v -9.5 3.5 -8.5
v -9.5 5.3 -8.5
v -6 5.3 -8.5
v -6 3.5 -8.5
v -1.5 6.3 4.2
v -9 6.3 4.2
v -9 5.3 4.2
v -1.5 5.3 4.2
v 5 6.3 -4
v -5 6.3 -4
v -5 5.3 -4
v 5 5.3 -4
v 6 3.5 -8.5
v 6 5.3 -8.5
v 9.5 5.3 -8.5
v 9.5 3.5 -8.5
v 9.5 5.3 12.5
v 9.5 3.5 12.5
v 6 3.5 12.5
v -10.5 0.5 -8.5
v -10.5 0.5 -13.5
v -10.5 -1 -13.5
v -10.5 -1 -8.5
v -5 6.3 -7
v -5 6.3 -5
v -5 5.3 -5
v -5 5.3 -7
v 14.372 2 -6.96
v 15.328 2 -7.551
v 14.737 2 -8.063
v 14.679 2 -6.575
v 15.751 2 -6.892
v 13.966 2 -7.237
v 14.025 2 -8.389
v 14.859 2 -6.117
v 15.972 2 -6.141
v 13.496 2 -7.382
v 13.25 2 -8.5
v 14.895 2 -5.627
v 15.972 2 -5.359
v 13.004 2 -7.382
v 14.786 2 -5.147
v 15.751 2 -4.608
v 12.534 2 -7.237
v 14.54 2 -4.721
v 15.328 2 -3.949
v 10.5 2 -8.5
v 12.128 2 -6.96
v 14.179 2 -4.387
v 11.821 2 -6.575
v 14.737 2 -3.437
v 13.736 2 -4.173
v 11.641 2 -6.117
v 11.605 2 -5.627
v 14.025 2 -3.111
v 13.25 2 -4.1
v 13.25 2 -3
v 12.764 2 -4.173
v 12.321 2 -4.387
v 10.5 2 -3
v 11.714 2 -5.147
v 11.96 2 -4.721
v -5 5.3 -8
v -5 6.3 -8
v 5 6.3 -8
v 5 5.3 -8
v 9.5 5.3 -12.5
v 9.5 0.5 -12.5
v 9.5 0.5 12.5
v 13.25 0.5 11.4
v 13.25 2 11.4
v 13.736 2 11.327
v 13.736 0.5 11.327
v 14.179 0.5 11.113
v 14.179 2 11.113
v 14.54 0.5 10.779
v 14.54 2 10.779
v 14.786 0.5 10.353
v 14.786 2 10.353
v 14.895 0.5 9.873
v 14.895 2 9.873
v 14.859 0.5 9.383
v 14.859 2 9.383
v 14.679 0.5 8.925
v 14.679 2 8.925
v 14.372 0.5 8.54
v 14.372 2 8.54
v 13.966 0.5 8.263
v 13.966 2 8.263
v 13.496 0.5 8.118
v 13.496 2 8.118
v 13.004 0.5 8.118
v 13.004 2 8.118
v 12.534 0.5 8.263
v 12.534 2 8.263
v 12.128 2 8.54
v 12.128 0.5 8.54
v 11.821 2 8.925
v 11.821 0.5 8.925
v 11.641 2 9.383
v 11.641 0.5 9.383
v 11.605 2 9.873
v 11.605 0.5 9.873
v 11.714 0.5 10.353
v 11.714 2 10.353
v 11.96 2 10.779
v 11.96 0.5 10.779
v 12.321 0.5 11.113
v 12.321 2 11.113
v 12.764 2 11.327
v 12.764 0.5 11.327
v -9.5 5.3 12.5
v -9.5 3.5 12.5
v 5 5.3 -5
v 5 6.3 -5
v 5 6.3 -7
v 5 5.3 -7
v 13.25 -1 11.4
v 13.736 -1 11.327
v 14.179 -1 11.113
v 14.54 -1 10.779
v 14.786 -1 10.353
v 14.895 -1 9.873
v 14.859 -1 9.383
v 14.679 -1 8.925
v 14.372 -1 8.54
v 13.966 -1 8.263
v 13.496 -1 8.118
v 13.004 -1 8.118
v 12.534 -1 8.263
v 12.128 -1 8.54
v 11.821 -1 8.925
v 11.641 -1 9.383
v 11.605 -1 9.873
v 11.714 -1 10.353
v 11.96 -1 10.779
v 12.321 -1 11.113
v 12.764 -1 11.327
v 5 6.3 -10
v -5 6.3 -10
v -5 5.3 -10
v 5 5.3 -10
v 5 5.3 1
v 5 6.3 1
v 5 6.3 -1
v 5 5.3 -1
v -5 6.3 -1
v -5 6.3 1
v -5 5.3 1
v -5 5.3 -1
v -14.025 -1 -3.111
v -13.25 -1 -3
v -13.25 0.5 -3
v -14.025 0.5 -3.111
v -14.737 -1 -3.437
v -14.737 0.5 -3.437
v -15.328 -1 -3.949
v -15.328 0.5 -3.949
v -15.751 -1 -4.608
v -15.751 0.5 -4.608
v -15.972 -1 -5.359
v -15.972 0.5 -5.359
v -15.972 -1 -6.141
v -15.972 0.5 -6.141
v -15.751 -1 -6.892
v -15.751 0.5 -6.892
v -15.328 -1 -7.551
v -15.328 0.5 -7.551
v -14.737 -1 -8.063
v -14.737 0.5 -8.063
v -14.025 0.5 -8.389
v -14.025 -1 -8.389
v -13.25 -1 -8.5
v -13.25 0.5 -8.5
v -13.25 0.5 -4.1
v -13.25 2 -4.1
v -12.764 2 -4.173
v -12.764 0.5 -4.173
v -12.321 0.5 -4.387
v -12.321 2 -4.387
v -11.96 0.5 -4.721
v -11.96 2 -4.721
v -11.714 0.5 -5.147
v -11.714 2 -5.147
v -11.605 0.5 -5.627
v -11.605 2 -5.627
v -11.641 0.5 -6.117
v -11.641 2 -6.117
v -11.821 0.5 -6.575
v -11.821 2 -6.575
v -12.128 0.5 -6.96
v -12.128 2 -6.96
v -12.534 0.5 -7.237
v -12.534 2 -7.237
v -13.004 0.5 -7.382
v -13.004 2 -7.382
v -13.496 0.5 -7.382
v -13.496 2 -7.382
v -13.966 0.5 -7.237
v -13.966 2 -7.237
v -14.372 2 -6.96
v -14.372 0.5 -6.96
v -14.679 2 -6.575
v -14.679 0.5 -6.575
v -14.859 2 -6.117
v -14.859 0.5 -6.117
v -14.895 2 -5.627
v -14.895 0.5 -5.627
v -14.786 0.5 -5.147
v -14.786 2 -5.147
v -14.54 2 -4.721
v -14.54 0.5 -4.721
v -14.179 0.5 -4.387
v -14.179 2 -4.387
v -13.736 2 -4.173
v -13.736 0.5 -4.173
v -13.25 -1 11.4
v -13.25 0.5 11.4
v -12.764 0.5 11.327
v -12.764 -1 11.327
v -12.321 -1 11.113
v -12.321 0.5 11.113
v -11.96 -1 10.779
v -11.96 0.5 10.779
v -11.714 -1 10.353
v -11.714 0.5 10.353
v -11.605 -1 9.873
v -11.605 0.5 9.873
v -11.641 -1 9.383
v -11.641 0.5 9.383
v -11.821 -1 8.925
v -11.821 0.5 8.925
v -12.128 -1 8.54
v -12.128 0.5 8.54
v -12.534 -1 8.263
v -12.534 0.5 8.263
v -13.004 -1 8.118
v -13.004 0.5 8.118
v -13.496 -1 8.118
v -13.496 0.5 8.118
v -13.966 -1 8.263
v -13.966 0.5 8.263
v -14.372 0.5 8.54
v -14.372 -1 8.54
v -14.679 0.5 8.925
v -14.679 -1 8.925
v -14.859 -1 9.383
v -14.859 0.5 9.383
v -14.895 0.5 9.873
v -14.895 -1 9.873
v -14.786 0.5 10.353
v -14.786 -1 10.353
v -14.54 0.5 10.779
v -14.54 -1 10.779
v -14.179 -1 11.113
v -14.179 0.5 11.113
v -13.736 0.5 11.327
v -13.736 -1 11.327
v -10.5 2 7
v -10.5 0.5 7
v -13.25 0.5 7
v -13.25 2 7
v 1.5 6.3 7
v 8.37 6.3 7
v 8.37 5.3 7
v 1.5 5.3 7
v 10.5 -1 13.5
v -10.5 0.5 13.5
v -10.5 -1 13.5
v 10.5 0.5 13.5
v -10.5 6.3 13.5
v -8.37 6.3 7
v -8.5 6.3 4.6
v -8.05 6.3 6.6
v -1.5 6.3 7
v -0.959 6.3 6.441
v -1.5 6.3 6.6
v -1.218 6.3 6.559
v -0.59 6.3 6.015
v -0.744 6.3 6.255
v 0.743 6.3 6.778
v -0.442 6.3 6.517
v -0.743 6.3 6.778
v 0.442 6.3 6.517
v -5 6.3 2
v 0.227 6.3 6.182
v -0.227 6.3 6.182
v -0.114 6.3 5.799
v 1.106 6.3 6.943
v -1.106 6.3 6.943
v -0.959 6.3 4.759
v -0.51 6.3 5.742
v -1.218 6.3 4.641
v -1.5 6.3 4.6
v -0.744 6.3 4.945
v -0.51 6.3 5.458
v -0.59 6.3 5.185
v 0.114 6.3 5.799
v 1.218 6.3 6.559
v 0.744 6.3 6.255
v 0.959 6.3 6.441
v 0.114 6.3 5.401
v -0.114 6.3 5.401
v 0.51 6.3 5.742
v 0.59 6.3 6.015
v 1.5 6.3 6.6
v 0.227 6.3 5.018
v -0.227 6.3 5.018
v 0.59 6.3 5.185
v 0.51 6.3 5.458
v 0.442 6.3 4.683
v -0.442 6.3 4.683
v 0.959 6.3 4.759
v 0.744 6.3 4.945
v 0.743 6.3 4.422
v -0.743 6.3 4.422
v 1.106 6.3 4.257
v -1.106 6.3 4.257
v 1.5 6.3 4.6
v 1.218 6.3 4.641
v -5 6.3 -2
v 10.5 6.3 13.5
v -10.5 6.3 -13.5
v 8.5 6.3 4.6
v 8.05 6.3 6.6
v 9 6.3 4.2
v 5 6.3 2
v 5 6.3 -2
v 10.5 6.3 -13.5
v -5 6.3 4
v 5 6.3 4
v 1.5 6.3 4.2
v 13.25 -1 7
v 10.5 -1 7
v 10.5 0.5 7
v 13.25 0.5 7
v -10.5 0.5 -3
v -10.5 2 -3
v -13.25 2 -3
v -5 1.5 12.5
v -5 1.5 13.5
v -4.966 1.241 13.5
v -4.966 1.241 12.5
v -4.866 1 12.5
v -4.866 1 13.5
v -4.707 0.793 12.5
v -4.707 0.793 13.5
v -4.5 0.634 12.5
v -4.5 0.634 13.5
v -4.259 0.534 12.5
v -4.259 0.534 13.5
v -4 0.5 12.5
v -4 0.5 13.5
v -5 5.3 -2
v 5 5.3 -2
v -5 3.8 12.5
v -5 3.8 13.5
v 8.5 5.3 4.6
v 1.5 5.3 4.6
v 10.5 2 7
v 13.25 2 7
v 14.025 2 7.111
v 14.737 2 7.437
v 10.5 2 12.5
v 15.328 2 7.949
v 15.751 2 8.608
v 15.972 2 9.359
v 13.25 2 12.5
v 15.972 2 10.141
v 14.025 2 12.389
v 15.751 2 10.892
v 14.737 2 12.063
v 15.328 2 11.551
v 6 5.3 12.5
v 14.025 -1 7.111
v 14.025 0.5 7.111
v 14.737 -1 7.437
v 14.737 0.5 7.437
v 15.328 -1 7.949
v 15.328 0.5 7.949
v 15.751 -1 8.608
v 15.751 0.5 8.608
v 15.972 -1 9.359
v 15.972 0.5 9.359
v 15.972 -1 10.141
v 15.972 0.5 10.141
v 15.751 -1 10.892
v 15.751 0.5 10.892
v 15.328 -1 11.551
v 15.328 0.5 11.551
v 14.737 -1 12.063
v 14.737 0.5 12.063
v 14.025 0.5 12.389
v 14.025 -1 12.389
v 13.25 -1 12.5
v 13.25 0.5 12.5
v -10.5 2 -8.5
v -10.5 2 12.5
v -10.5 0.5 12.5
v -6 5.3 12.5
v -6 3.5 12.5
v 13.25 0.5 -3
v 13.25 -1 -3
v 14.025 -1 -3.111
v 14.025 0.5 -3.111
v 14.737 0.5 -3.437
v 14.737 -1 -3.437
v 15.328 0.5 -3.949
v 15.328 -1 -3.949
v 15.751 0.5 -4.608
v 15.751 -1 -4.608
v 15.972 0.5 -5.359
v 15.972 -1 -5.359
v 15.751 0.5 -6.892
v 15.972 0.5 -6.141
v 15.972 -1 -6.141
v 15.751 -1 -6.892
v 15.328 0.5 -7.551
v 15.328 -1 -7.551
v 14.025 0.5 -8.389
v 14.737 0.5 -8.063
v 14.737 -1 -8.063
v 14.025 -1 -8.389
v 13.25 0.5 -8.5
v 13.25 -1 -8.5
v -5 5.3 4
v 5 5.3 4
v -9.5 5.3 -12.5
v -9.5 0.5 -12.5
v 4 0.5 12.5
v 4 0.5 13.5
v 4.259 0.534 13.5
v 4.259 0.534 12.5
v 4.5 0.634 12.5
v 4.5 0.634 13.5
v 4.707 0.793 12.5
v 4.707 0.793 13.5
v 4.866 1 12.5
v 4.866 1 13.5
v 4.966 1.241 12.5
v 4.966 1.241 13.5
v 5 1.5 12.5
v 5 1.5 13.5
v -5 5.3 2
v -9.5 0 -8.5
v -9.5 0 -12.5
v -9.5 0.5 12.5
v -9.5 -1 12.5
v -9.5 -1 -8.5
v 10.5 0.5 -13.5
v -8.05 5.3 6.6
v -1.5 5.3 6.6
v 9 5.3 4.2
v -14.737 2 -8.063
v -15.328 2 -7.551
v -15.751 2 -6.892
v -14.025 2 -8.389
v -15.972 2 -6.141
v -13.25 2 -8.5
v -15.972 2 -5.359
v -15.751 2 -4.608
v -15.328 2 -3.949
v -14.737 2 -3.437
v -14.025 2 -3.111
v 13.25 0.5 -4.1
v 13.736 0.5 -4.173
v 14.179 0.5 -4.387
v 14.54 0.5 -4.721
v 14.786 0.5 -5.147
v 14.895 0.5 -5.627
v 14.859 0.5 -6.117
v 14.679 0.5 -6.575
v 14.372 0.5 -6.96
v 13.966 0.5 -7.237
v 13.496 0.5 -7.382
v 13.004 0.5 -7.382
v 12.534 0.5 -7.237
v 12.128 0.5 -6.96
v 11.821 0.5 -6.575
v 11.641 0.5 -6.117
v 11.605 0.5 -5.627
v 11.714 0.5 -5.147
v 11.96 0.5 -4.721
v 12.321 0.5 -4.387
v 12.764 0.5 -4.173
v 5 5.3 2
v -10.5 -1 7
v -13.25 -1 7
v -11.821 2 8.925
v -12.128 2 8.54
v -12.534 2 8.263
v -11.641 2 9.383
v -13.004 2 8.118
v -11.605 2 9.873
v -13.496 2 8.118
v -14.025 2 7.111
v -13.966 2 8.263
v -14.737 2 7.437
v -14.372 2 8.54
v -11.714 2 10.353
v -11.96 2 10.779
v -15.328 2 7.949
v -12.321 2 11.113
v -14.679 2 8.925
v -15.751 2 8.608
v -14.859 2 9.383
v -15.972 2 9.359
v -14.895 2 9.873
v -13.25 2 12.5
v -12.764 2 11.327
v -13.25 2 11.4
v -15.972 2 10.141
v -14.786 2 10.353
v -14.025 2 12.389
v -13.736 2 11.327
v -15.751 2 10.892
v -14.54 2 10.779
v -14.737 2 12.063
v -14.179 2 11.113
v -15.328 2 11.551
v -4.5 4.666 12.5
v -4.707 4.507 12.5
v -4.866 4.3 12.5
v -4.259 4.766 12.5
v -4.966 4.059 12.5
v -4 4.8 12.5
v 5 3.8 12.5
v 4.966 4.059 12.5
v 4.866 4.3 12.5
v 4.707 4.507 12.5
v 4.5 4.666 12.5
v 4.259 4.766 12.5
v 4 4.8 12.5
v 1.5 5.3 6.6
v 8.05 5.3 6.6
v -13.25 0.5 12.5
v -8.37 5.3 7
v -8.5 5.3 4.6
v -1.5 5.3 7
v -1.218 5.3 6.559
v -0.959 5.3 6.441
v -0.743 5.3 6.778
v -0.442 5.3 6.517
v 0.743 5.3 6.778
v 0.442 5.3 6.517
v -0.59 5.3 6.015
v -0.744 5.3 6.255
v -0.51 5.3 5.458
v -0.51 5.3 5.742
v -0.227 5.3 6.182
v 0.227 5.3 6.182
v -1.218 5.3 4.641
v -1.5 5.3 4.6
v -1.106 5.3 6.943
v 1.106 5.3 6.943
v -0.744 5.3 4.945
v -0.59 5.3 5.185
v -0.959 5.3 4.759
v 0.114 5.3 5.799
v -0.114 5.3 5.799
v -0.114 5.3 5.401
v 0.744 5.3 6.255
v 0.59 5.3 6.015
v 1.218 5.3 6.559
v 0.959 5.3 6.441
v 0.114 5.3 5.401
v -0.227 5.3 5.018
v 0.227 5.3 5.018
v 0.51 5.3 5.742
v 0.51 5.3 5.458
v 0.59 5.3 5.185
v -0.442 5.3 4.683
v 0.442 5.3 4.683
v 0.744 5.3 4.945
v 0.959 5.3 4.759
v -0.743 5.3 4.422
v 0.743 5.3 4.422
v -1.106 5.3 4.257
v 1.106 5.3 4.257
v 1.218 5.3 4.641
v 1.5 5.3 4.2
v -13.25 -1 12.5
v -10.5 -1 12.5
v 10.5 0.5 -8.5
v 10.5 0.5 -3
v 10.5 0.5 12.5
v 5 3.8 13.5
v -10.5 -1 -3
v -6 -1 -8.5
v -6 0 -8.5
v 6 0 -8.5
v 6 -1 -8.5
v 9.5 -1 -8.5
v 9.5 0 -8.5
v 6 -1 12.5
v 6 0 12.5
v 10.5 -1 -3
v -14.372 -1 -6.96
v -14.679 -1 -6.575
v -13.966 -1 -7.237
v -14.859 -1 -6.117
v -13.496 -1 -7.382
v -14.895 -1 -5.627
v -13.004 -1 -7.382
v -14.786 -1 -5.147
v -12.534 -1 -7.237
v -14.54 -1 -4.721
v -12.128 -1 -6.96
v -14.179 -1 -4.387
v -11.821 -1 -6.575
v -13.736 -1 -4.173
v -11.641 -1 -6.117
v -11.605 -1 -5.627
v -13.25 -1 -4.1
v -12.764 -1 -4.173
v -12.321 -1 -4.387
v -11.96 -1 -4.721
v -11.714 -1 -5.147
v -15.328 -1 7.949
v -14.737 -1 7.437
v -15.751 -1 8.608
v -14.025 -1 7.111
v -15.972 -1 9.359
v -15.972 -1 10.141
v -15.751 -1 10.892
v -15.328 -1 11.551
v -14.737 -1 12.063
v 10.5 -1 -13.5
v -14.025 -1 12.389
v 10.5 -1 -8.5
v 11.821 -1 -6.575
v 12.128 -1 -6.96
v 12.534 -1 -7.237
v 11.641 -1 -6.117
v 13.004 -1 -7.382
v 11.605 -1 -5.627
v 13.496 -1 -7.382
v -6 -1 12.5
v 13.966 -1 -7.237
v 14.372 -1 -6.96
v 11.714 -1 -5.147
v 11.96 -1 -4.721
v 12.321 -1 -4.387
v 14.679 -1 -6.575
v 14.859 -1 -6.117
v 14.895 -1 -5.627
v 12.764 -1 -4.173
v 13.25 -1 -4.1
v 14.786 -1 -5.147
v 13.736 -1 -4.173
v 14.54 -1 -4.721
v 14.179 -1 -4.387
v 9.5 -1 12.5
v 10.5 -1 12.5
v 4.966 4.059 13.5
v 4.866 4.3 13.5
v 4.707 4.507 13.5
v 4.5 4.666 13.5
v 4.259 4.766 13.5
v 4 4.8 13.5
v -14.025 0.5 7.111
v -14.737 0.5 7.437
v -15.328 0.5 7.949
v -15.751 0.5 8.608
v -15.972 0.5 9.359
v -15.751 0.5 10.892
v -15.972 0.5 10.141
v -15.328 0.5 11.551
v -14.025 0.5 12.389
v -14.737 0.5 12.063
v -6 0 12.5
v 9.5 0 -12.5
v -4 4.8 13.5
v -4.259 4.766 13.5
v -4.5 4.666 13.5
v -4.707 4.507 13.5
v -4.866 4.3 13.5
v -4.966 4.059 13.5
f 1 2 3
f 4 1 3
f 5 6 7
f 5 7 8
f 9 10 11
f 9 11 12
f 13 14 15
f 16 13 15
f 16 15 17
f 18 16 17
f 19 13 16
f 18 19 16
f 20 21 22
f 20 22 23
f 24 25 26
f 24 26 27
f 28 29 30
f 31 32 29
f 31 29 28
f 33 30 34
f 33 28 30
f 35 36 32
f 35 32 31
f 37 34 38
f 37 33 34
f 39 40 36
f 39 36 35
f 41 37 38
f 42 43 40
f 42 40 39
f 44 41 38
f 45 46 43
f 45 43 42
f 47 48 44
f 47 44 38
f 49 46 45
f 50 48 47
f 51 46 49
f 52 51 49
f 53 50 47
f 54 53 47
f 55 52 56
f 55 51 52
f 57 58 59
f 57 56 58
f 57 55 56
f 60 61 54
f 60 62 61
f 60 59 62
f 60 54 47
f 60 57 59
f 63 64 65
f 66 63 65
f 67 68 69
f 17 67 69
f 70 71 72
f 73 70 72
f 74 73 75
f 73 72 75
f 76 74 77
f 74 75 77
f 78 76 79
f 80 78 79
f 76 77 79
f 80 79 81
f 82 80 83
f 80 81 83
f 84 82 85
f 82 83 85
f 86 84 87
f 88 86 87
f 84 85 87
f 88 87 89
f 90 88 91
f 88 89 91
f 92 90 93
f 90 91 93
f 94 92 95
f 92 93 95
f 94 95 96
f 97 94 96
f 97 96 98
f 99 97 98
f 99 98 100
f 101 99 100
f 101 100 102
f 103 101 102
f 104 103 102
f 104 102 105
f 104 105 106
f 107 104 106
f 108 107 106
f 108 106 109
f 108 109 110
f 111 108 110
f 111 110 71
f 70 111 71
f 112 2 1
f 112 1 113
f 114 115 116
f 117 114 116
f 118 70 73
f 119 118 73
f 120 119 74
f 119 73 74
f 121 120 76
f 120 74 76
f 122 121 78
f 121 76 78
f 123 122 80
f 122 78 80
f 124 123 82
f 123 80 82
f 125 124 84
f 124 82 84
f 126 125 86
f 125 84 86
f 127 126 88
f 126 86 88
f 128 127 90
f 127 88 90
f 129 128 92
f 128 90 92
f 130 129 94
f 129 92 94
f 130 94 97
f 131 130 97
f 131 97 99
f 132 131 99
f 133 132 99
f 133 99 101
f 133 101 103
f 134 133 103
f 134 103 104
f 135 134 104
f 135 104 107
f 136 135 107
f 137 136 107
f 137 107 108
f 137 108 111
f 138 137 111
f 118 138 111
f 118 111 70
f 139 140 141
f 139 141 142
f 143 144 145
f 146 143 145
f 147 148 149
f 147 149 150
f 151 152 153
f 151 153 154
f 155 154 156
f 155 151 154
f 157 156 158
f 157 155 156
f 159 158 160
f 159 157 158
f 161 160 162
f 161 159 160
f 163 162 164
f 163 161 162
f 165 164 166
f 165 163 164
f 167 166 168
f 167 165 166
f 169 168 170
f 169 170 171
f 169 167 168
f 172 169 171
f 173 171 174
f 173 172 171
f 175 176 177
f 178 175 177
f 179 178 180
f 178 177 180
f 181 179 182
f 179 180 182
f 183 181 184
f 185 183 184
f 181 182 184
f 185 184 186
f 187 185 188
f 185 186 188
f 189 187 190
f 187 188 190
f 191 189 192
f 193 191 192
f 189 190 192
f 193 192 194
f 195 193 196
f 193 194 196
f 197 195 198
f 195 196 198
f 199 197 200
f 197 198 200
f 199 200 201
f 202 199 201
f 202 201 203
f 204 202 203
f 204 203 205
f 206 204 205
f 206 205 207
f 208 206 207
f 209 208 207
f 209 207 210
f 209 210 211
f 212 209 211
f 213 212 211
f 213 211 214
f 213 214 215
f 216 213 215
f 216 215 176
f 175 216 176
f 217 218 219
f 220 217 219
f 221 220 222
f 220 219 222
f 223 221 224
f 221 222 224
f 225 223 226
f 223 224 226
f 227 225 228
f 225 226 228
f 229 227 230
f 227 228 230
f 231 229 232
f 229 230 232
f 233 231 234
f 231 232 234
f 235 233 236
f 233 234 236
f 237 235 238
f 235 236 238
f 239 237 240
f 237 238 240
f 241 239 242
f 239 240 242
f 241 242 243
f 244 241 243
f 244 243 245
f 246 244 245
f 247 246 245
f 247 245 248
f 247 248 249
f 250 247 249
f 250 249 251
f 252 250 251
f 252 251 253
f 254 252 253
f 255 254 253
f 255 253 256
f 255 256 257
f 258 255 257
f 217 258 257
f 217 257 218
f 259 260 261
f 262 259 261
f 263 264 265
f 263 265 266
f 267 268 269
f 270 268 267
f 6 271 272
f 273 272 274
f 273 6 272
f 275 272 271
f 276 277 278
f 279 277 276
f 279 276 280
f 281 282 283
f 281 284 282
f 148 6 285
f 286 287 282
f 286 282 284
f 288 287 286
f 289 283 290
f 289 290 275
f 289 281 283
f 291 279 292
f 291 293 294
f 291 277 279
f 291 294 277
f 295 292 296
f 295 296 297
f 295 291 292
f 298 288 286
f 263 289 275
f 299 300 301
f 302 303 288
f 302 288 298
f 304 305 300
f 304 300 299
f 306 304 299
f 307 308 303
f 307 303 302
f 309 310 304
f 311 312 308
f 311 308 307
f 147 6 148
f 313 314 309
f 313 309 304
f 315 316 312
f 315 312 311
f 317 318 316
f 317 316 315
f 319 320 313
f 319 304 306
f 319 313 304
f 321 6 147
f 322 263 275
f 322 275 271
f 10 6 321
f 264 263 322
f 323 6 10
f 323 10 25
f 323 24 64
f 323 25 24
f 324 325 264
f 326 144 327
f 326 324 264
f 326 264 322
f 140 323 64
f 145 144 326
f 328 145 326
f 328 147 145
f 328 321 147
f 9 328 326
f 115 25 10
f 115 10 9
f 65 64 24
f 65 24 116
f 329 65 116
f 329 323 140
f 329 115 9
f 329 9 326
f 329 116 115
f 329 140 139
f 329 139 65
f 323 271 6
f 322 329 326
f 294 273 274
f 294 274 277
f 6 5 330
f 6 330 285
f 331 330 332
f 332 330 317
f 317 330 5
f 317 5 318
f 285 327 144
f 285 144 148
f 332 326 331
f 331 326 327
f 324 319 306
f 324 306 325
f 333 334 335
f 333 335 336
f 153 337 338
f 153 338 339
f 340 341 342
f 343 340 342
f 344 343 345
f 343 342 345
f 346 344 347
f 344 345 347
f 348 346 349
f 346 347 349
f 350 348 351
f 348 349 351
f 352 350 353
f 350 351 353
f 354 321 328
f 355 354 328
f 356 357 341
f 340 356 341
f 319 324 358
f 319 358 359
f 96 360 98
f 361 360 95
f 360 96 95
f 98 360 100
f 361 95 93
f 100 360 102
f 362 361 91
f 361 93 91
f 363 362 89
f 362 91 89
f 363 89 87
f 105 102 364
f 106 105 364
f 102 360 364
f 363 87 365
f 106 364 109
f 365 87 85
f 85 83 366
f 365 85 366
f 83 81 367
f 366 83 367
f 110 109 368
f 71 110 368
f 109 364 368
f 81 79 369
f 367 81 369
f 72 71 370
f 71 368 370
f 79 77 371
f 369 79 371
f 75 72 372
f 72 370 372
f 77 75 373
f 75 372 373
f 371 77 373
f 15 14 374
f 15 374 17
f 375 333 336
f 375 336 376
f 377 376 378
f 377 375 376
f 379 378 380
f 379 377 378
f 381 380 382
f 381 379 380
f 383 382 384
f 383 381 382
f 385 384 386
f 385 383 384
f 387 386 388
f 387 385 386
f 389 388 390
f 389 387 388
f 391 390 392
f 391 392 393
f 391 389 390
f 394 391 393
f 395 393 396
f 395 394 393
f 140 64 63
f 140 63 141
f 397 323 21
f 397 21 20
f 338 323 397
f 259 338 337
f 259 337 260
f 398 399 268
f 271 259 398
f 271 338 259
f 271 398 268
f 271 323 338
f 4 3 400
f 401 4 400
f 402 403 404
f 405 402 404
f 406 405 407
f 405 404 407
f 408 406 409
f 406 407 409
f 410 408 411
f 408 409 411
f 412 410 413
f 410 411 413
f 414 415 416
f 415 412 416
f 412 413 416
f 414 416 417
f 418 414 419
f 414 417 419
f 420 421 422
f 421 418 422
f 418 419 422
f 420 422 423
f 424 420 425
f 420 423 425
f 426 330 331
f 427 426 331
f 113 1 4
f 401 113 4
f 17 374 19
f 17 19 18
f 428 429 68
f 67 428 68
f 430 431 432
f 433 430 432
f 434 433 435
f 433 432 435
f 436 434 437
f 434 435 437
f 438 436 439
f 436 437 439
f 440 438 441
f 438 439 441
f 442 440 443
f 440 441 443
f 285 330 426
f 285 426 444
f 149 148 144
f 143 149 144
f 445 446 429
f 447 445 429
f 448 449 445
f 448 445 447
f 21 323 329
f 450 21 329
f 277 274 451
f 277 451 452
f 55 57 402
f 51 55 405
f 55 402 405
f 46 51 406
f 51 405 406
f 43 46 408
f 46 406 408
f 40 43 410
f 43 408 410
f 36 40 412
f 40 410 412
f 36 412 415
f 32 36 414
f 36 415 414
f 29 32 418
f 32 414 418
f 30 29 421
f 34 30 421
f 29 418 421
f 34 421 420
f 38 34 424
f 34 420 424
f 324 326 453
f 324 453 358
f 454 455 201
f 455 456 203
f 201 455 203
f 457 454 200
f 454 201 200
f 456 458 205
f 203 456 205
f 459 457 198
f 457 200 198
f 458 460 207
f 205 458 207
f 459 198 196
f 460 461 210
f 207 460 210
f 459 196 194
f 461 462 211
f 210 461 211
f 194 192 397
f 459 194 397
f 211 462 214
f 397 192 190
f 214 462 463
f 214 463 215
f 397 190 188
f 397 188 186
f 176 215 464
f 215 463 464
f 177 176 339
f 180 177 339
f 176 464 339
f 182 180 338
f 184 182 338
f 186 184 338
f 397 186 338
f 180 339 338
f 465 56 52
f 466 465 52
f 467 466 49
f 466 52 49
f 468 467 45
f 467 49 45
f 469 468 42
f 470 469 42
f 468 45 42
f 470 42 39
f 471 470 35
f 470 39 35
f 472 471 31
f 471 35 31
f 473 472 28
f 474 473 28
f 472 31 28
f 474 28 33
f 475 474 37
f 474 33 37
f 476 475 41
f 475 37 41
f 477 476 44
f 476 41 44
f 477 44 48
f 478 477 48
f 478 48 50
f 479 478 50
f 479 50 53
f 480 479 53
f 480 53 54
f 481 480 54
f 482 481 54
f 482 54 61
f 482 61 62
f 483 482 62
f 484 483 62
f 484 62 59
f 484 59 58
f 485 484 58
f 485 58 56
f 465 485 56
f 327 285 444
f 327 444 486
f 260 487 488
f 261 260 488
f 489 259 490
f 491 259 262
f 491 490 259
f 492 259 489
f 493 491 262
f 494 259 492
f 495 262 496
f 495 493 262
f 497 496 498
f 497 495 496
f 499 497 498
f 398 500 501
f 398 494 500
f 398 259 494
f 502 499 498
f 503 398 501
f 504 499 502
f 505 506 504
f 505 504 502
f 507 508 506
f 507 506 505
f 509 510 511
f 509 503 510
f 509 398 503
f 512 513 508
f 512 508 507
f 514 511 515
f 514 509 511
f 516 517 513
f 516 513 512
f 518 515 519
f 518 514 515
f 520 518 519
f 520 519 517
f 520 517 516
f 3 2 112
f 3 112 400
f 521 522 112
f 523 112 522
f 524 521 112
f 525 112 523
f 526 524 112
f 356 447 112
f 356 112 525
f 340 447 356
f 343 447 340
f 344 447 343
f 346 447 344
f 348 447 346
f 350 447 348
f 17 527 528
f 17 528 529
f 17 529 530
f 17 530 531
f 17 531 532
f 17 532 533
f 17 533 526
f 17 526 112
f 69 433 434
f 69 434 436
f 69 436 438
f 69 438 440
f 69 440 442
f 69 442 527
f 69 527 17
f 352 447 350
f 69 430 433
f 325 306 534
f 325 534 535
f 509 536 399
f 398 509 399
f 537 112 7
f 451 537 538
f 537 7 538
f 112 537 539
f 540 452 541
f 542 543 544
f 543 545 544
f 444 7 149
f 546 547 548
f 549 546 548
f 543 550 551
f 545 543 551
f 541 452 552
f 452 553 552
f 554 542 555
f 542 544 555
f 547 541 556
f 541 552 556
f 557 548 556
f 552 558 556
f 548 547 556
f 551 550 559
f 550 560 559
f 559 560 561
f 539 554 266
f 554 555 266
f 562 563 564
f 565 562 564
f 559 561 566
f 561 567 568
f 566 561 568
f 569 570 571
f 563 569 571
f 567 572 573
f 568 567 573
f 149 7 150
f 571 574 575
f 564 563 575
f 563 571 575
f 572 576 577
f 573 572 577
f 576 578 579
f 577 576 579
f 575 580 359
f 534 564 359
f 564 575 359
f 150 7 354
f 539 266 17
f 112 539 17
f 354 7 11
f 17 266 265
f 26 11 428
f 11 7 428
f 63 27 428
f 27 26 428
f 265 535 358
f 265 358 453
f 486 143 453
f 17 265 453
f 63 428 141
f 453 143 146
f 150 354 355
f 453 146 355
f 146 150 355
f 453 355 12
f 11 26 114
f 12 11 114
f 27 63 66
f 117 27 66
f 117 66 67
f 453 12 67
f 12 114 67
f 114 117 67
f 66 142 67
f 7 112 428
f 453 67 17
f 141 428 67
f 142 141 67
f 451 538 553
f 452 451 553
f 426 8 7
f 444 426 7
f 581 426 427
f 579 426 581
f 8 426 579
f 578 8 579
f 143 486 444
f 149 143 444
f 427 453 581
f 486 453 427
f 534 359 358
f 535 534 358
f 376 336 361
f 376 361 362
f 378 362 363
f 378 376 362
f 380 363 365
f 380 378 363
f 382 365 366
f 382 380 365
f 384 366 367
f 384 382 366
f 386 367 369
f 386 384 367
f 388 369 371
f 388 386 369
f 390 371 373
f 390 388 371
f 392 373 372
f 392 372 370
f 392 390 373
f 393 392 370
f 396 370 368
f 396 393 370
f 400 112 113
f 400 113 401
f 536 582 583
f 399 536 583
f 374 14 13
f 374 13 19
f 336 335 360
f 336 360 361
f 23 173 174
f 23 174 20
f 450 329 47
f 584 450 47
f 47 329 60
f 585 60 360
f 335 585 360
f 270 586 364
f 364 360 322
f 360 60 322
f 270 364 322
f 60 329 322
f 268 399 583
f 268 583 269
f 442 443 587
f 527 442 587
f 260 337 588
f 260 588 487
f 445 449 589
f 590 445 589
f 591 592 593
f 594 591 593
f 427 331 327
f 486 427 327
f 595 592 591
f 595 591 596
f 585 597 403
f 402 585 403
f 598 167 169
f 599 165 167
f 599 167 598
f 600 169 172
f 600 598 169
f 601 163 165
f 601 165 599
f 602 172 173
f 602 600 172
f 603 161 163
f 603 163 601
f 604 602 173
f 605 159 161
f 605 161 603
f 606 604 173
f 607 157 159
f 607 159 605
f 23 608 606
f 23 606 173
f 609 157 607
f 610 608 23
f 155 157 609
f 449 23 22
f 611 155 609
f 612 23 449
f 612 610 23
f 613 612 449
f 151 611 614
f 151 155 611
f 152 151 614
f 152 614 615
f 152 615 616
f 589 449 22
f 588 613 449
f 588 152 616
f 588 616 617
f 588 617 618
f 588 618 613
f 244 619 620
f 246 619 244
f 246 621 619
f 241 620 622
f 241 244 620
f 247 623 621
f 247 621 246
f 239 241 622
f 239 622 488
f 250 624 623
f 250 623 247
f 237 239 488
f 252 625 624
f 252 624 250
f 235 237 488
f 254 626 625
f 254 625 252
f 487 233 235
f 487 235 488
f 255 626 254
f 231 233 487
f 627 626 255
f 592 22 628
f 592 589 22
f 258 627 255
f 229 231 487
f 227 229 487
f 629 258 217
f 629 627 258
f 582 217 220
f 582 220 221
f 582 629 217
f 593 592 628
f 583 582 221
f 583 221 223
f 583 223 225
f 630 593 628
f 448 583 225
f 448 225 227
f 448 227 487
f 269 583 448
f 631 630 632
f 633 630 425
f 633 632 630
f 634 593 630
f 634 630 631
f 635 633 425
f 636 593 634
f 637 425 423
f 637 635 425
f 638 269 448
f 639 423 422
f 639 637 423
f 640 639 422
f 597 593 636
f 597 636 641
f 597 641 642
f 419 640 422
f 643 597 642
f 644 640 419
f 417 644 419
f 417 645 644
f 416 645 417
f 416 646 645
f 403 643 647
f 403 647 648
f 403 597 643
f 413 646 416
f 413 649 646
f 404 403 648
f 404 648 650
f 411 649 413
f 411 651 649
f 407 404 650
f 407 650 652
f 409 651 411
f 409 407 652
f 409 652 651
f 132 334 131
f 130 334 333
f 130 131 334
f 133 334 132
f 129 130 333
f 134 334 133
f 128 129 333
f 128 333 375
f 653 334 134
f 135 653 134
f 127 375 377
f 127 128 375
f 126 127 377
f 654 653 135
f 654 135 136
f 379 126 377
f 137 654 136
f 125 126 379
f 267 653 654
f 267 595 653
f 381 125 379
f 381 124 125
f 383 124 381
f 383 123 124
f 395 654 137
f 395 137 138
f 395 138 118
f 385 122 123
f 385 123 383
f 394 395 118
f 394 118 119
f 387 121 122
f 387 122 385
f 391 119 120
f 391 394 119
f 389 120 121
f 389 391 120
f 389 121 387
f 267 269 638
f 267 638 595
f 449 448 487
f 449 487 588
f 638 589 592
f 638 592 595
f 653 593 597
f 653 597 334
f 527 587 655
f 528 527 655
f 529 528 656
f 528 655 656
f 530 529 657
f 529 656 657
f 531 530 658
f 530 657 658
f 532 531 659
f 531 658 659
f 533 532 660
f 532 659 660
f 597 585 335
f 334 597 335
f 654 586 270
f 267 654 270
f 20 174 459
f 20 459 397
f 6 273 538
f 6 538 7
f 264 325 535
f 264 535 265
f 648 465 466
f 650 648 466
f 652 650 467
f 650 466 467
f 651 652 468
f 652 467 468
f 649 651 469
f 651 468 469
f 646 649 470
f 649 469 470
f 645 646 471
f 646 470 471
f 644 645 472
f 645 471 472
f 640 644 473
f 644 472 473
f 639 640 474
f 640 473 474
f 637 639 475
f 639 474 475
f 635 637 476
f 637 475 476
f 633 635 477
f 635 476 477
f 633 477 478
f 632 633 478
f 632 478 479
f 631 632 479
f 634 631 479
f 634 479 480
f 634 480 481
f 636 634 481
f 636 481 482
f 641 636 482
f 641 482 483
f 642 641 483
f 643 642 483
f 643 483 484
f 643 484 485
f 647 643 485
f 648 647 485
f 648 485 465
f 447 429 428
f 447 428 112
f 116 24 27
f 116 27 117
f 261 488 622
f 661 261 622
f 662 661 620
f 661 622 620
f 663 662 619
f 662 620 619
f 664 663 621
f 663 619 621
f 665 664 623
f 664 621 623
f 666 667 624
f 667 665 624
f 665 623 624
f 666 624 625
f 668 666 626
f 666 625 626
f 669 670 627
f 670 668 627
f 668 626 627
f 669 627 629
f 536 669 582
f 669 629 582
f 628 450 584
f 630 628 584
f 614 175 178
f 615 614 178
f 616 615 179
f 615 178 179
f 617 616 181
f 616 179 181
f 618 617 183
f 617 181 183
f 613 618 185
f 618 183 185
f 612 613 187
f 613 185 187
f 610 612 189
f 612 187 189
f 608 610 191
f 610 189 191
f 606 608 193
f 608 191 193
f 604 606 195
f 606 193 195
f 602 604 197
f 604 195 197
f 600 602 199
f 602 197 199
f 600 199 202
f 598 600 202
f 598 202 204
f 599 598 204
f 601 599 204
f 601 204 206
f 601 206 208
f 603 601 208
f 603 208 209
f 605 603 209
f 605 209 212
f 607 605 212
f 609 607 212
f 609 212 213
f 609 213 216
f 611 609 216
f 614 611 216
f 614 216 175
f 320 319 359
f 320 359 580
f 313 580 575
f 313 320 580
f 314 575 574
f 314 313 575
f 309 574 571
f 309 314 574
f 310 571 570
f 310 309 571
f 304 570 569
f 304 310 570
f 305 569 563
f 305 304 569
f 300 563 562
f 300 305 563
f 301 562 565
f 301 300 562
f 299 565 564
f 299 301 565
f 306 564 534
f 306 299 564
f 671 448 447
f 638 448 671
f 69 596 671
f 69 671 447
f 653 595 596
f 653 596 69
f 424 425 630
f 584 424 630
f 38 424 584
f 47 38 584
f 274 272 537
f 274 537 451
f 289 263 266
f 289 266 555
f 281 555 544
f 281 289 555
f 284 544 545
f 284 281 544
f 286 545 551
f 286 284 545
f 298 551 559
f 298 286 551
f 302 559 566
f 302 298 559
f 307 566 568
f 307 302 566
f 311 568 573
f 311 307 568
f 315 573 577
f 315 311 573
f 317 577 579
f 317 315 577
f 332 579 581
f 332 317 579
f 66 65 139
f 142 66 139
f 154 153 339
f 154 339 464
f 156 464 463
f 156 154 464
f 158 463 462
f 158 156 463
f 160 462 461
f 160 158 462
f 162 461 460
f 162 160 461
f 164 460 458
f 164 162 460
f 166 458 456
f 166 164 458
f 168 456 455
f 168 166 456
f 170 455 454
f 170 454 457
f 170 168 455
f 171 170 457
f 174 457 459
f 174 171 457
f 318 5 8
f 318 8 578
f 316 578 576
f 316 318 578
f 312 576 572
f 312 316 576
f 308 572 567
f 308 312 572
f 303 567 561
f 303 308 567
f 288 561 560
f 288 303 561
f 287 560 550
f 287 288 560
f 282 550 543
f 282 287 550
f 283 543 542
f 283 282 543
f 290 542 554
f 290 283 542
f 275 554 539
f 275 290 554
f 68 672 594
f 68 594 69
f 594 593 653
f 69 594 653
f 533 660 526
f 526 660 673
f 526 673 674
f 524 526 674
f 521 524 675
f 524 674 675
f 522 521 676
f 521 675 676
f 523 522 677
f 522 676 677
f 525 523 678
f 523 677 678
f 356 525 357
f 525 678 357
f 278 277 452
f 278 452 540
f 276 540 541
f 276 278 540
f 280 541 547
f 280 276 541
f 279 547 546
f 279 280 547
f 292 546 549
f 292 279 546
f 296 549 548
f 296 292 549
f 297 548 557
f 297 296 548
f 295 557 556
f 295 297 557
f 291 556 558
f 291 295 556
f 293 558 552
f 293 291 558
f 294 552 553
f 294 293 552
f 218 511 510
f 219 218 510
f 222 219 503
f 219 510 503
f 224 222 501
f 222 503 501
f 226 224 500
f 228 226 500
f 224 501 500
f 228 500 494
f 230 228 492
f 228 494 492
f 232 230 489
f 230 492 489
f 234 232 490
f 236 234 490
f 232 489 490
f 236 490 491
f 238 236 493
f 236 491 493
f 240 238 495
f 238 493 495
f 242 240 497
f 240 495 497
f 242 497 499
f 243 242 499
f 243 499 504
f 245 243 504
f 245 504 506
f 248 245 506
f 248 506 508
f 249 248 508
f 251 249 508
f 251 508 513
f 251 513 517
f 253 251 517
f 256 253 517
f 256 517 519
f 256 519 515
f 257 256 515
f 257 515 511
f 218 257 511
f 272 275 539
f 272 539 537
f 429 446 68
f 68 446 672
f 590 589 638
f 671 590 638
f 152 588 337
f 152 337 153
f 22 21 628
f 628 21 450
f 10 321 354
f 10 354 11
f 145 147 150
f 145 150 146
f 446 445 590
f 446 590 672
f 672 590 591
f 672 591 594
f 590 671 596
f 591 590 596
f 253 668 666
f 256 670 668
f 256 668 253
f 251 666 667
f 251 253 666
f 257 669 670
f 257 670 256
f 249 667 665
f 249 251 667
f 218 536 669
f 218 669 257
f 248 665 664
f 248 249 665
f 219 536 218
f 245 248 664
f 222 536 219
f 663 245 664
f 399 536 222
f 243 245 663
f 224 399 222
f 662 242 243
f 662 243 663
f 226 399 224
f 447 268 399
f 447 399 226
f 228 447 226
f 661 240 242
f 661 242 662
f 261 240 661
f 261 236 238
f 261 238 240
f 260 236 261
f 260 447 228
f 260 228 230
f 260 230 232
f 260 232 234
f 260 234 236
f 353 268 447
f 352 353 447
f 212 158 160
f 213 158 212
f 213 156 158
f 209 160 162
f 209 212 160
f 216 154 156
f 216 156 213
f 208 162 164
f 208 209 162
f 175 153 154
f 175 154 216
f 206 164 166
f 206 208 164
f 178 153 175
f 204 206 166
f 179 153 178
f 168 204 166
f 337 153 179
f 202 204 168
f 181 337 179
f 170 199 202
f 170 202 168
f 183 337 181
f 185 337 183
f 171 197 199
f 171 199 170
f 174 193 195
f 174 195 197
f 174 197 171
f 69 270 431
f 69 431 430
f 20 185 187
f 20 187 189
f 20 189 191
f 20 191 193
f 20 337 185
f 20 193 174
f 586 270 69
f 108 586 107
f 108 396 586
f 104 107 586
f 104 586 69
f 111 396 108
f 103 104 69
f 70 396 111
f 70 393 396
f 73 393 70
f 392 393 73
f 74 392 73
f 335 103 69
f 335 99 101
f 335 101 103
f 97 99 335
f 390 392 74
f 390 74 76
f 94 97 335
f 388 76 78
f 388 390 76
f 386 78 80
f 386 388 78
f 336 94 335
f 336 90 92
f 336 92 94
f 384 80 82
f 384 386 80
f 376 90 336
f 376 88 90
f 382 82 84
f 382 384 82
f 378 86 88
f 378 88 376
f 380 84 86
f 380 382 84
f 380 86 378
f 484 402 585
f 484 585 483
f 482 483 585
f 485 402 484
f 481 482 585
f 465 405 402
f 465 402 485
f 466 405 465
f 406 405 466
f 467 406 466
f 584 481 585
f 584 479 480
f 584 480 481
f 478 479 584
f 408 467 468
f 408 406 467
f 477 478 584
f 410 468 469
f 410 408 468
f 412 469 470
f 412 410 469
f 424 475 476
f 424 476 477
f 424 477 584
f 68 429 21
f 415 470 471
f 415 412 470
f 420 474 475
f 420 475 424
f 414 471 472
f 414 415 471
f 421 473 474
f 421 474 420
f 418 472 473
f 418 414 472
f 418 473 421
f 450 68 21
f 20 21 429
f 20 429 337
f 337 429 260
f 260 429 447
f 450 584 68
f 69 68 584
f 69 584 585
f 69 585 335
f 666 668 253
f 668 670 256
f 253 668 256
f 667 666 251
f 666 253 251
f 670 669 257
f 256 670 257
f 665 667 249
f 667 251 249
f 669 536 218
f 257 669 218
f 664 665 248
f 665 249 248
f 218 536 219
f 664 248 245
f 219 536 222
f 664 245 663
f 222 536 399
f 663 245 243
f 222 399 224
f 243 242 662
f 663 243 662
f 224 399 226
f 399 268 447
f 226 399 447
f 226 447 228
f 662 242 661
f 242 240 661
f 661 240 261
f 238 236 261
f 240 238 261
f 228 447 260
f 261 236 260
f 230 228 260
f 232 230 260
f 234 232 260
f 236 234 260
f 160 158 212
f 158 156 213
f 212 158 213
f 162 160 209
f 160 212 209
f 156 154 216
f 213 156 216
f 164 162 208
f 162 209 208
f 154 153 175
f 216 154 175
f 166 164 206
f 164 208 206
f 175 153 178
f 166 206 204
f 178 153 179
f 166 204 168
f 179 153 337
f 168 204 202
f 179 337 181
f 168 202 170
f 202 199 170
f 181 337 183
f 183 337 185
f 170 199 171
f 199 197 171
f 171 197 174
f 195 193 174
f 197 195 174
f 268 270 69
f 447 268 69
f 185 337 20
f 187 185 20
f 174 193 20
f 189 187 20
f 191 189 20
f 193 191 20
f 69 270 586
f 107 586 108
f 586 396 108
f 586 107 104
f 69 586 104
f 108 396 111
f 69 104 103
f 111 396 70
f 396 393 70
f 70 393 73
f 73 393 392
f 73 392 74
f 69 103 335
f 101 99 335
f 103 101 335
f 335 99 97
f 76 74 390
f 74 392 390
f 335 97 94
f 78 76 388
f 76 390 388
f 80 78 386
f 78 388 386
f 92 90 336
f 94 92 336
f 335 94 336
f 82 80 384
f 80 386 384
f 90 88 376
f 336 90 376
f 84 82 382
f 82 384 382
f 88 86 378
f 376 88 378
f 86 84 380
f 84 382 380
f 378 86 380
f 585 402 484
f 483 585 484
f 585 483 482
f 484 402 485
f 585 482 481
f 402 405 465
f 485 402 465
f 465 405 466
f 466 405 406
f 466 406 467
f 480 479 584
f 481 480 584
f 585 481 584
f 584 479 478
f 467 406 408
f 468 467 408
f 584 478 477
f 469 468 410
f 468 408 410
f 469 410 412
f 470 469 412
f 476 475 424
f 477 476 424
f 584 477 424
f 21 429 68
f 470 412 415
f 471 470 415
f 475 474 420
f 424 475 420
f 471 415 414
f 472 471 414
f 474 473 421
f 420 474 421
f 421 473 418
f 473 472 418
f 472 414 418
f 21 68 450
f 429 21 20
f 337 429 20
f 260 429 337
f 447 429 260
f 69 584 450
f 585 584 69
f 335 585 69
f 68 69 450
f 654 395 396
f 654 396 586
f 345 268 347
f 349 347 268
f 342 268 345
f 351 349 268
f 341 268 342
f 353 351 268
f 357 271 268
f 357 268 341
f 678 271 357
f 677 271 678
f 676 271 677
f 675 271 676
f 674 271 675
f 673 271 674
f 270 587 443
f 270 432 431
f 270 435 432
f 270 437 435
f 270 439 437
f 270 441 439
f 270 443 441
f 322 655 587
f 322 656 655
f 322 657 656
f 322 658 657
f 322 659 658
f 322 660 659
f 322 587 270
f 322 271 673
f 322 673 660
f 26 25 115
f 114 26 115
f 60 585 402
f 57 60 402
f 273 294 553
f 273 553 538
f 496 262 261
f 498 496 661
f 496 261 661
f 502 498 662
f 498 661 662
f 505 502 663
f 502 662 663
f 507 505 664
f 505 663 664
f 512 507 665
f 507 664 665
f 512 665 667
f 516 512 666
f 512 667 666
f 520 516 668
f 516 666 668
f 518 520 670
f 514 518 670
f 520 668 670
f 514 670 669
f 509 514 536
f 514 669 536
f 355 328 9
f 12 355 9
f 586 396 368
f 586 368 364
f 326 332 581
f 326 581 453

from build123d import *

# Parameters (mm, degrees)
SKETCH_1_W          = 21
SKETCH_1_H          = 27
SKETCH_1_W_2        = 19
SKETCH_1_H_2        = 25
EXTRUDE_1_DEPTH     = 6.3
CUT_EXTRUDE_1_REACH = 31.647
SKETCH_3_W          = 21
SKETCH_3_H          = 27
EXTRUDE_1_2_DEPTH   = 1
CUT_EXTRUDE_2_REACH = 20.595
SKETCH_4_W          = 3.5
SKETCH_4_H          = 21
EXTRUDE_2_DEPTH     = 3
CUT_EXTRUDE_3_REACH = 23.371
SKETCH_6_R          = 1.65
SKETCH_7_W          = 19
SKETCH_7_H          = 25
EXTRUDE_3_DEPTH     = 1
SKETCH_8_W          = 3.5
SKETCH_8_H          = 21
EXTRUDE_4_DEPTH     = 1.8
EXTRUDE_4_2_DEPTH   = 1.8
SKETCH_9_W          = 10
SKETCH_9_H          = 2
CUT_EXTRUDE_6_DEPTH = 1
CUT_EXTRUDE_7_DEPTH = 1


with BuildPart() as part:
    # 草图1 → Extrude 1 (new body)
    with BuildSketch(Plane.XZ):
        Rectangle(SKETCH_1_W, SKETCH_1_H)
        Rectangle(SKETCH_1_W_2, SKETCH_1_H_2, mode=Mode.SUBTRACT)
    extrude(amount=-EXTRUDE_1_DEPTH)

    # 草图2 → 切除-拉伸1 (cut, up to next)
    with BuildSketch(Plane.XY.offset(13.5), mode=Mode.PRIVATE) as cut_extrude_1_sk1:
        with BuildLine():
            Line((-4, 0.5), (4, 0.5))
            ThreePointArc((4, 0.5), (4.707106781, 0.792893219), (5, 1.5))
            Line((5, 1.5), (5, 3.8))
            ThreePointArc((5, 3.8), (4.707106781, 4.507106781), (4, 4.8))
            Line((4, 4.8), (-4, 4.8))
            ThreePointArc((-4, 4.8), (-4.707106781, 4.507106781), (-5, 3.8))
            Line((-5, 3.8), (-5, 1.5))
            ThreePointArc((-5, 1.5), (-4.707106781, 0.792893219), (-4, 0.5))
        make_face()
    cut_extrude_1_tool1 = extrude(cut_extrude_1_sk1.sketch, amount=-CUT_EXTRUDE_1_REACH, mode=Mode.PRIVATE) & part.part
    add(cut_extrude_1_tool1.solids().sort_by_distance((0, 2.65, 13.5))[0], mode=Mode.SUBTRACT)

    # 草图3 → Extrude 1 2 (add)
    with BuildSketch(Plane.XZ):
        Rectangle(SKETCH_3_W, SKETCH_3_H)
    extrude(amount=EXTRUDE_1_2_DEPTH)

    # 草图4 → 切除-拉伸2 (cut, up to next)
    with BuildSketch(Plane.XZ.offset(1), mode=Mode.PRIVATE) as cut_extrude_2_sk1:
        with Locations((-7.75, 2)):
            Rectangle(SKETCH_4_W, SKETCH_4_H)
    cut_extrude_2_tool1 = extrude(cut_extrude_2_sk1.sketch, amount=-CUT_EXTRUDE_2_REACH, mode=Mode.PRIVATE) & part.part
    # 草图4 → 切除-拉伸2 (cut, up to next)
    with BuildSketch(Plane.XZ.offset(1), mode=Mode.PRIVATE) as cut_extrude_2_sk2:
        with Locations((7.75, 2)):
            Rectangle(SKETCH_4_W, SKETCH_4_H)
    cut_extrude_2_tool2 = extrude(cut_extrude_2_sk2.sketch, amount=-CUT_EXTRUDE_2_REACH, mode=Mode.PRIVATE) & part.part
    add(cut_extrude_2_tool1.solids().sort_by_distance((-7.75, -1, 2))[0], mode=Mode.SUBTRACT)
    add(cut_extrude_2_tool2.solids().sort_by_distance((7.75, -1, 2))[0], mode=Mode.SUBTRACT)

    # 草图5 → 凸台-拉伸2 (add)
    with BuildSketch(Plane.XZ.offset(1)):
        with BuildLine():
            Line((-13.25, 12.5), (-10.5, 12.5))
            Line((-10.5, 12.5), (-10.5, 7))
            Line((-10.5, 7), (-13.25, 7))
            ThreePointArc((-13.25, 7), (-16, 9.75), (-13.25, 12.5))
        make_face()
        with BuildLine():
            Line((-10.5, -8.5), (-10.5, -3))
            Line((-10.5, -3), (-13.25, -3))
            ThreePointArc((-13.25, -3), (-16, -5.75), (-13.25, -8.5))
            Line((-13.25, -8.5), (-10.5, -8.5))
        make_face()
        with BuildLine():
            Line((13.25, -8.5), (10.5, -8.5))
            Line((10.5, -8.5), (10.5, -3))
            Line((10.5, -3), (13.25, -3))
            ThreePointArc((13.25, -3), (16, -5.75), (13.25, -8.5))
        make_face()
        with BuildLine():
            Line((10.5, 12.5), (10.5, 7))
            Line((10.5, 7), (13.25, 7))
            ThreePointArc((13.25, 7), (16, 9.75), (13.25, 12.5))
            Line((13.25, 12.5), (10.5, 12.5))
        make_face()
    extrude(amount=-EXTRUDE_2_DEPTH)

    # 草图6 → 切除-拉伸3 (cut, up to next)
    with BuildSketch(Plane(origin=(0, 2, 0), x_dir=(1, 0, 0), z_dir=(0, 1, 0)), mode=Mode.PRIVATE) as cut_extrude_3_sk1:
        with Locations(Location((-13.25, 5.75, 0), (0, 0, 270))):
            Circle(SKETCH_6_R)
    cut_extrude_3_tool1 = extrude(cut_extrude_3_sk1.sketch, amount=-CUT_EXTRUDE_3_REACH, mode=Mode.PRIVATE) & part.part
    # 草图6 → 切除-拉伸3 (cut, up to next)
    with BuildSketch(Plane(origin=(0, 2, 0), x_dir=(1, 0, 0), z_dir=(0, 1, 0)), mode=Mode.PRIVATE) as cut_extrude_3_sk2:
        with Locations(Location((-13.25, -9.75, 0), (0, 0, 270))):
            Circle(SKETCH_6_R)
    cut_extrude_3_tool2 = extrude(cut_extrude_3_sk2.sketch, amount=-CUT_EXTRUDE_3_REACH, mode=Mode.PRIVATE) & part.part
    # 草图6 → 切除-拉伸3 (cut, up to next)
    with BuildSketch(Plane(origin=(0, 2, 0), x_dir=(1, 0, 0), z_dir=(0, 1, 0)), mode=Mode.PRIVATE) as cut_extrude_3_sk3:
        with Locations(Location((13.25, -9.75, 0), (0, 0, 270))):
            Circle(SKETCH_6_R)
    cut_extrude_3_tool3 = extrude(cut_extrude_3_sk3.sketch, amount=-CUT_EXTRUDE_3_REACH, mode=Mode.PRIVATE) & part.part
    # 草图6 → 切除-拉伸3 (cut, up to next)
    with BuildSketch(Plane(origin=(0, 2, 0), x_dir=(1, 0, 0), z_dir=(0, 1, 0)), mode=Mode.PRIVATE) as cut_extrude_3_sk4:
        with Locations(Location((13.25, 5.75, 0), (0, 0, 270))):
            Circle(SKETCH_6_R)
    cut_extrude_3_tool4 = extrude(cut_extrude_3_sk4.sketch, amount=-CUT_EXTRUDE_3_REACH, mode=Mode.PRIVATE) & part.part
    add(cut_extrude_3_tool1.solids().sort_by_distance((-13.25, 2, -5.75))[0], mode=Mode.SUBTRACT)
    add(cut_extrude_3_tool2.solids().sort_by_distance((-13.25, 2, 9.75))[0], mode=Mode.SUBTRACT)
    add(cut_extrude_3_tool3.solids().sort_by_distance((13.25, 2, 9.75))[0], mode=Mode.SUBTRACT)
    add(cut_extrude_3_tool4.solids().sort_by_distance((13.25, 2, -5.75))[0], mode=Mode.SUBTRACT)

    # 草图7 → 凸台-拉伸3 (add)
    with BuildSketch(Plane(origin=(0, 6.3, 0), x_dir=(1, 0, 0), z_dir=(0, 1, 0))):
        Rectangle(SKETCH_7_W, SKETCH_7_H)
    extrude(amount=-EXTRUDE_3_DEPTH)

    # 草图9 → 切除-拉伸6 (cut)
    with BuildSketch(Plane(origin=(0, 6.3, 0), x_dir=(1, 0, 0), z_dir=(0, 1, 0))):
        with Locations((0, 9)):
            Rectangle(SKETCH_9_W, SKETCH_9_H)
        with Locations((0, 6)):
            Rectangle(SKETCH_9_W, SKETCH_9_H)
        with Locations((0, 3)):
            Rectangle(SKETCH_9_W, SKETCH_9_H)
        Rectangle(SKETCH_9_W, SKETCH_9_H)
        with Locations((0, -3)):
            Rectangle(SKETCH_9_W, SKETCH_9_H)
    extrude(amount=-CUT_EXTRUDE_6_DEPTH, mode=Mode.SUBTRACT)

    # 草图10 → 切除-拉伸7 (cut)
    with BuildSketch(Plane(origin=(0, 6.3, 0), x_dir=(1, 0, 0), z_dir=(0, 1, 0))):
        with BuildLine():
            Line((-1.5, -4.6), (-8.5, -4.6))
            Line((-8.5, -4.6), (-9, -4.2))
            Line((-9, -4.2), (-1.5, -4.2))
            ThreePointArc((-1.5, -4.2), (-0.1, -5.6), (-1.5, -7))
            Line((-1.5, -7), (-8.37, -7))
            Line((-8.37, -7), (-8.05, -6.6))
            Line((-8.05, -6.6), (-1.5, -6.6))
            ThreePointArc((-1.5, -6.6), (-0.5, -5.6), (-1.5, -4.6))
        make_face()
        with BuildLine():
            Line((8.05, -6.6), (8.37, -7))
            Line((8.37, -7), (1.5, -7))
            ThreePointArc((1.5, -7), (0.1, -5.6), (1.5, -4.2))
            Line((1.5, -4.2), (9, -4.2))
            Line((9, -4.2), (8.5, -4.6))
            Line((8.5, -4.6), (1.5, -4.6))
            ThreePointArc((1.5, -4.6), (0.5, -5.6), (1.5, -6.6))
            Line((1.5, -6.6), (8.05, -6.6))
        make_face()
    extrude(amount=-CUT_EXTRUDE_7_DEPTH, mode=Mode.SUBTRACT)


with BuildPart() as body_2:
    # 草图8 → 凸台-拉伸4 (new body)
    with BuildSketch(Plane.XZ.offset(-5.3)):
        with Locations((-7.75, 2)):
            Rectangle(SKETCH_8_W, SKETCH_8_H)
    extrude(amount=EXTRUDE_4_DEPTH)


with BuildPart() as body_3:
    # 草图8 → Extrude 4 2 (new body)
    with BuildSketch(Plane.XZ.offset(-5.3)):
        with Locations((7.75, 2)):
            Rectangle(SKETCH_8_W, SKETCH_8_H)
    extrude(amount=EXTRUDE_4_2_DEPTH)


with BuildPart() as body_4:
    # Split Bodies 1: the piece on the far side of the plane
    add(part.part)
    split(bisect_by=Plane(origin=(0, 0.5, 0), x_dir=(0, 0, -1), z_dir=(0, -1, 0)), keep=Keep.BOTTOM)


with BuildPart() as part_1:
    add(part.part)

    # Split Bodies 1
    split(bisect_by=Plane(origin=(0, 0.5, 0), x_dir=(0, 0, -1), z_dir=(0, -1, 0)), keep=Keep.TOP)


solid = Compound([body_2.part, body_3.part, body_4.part, part_1.part])
